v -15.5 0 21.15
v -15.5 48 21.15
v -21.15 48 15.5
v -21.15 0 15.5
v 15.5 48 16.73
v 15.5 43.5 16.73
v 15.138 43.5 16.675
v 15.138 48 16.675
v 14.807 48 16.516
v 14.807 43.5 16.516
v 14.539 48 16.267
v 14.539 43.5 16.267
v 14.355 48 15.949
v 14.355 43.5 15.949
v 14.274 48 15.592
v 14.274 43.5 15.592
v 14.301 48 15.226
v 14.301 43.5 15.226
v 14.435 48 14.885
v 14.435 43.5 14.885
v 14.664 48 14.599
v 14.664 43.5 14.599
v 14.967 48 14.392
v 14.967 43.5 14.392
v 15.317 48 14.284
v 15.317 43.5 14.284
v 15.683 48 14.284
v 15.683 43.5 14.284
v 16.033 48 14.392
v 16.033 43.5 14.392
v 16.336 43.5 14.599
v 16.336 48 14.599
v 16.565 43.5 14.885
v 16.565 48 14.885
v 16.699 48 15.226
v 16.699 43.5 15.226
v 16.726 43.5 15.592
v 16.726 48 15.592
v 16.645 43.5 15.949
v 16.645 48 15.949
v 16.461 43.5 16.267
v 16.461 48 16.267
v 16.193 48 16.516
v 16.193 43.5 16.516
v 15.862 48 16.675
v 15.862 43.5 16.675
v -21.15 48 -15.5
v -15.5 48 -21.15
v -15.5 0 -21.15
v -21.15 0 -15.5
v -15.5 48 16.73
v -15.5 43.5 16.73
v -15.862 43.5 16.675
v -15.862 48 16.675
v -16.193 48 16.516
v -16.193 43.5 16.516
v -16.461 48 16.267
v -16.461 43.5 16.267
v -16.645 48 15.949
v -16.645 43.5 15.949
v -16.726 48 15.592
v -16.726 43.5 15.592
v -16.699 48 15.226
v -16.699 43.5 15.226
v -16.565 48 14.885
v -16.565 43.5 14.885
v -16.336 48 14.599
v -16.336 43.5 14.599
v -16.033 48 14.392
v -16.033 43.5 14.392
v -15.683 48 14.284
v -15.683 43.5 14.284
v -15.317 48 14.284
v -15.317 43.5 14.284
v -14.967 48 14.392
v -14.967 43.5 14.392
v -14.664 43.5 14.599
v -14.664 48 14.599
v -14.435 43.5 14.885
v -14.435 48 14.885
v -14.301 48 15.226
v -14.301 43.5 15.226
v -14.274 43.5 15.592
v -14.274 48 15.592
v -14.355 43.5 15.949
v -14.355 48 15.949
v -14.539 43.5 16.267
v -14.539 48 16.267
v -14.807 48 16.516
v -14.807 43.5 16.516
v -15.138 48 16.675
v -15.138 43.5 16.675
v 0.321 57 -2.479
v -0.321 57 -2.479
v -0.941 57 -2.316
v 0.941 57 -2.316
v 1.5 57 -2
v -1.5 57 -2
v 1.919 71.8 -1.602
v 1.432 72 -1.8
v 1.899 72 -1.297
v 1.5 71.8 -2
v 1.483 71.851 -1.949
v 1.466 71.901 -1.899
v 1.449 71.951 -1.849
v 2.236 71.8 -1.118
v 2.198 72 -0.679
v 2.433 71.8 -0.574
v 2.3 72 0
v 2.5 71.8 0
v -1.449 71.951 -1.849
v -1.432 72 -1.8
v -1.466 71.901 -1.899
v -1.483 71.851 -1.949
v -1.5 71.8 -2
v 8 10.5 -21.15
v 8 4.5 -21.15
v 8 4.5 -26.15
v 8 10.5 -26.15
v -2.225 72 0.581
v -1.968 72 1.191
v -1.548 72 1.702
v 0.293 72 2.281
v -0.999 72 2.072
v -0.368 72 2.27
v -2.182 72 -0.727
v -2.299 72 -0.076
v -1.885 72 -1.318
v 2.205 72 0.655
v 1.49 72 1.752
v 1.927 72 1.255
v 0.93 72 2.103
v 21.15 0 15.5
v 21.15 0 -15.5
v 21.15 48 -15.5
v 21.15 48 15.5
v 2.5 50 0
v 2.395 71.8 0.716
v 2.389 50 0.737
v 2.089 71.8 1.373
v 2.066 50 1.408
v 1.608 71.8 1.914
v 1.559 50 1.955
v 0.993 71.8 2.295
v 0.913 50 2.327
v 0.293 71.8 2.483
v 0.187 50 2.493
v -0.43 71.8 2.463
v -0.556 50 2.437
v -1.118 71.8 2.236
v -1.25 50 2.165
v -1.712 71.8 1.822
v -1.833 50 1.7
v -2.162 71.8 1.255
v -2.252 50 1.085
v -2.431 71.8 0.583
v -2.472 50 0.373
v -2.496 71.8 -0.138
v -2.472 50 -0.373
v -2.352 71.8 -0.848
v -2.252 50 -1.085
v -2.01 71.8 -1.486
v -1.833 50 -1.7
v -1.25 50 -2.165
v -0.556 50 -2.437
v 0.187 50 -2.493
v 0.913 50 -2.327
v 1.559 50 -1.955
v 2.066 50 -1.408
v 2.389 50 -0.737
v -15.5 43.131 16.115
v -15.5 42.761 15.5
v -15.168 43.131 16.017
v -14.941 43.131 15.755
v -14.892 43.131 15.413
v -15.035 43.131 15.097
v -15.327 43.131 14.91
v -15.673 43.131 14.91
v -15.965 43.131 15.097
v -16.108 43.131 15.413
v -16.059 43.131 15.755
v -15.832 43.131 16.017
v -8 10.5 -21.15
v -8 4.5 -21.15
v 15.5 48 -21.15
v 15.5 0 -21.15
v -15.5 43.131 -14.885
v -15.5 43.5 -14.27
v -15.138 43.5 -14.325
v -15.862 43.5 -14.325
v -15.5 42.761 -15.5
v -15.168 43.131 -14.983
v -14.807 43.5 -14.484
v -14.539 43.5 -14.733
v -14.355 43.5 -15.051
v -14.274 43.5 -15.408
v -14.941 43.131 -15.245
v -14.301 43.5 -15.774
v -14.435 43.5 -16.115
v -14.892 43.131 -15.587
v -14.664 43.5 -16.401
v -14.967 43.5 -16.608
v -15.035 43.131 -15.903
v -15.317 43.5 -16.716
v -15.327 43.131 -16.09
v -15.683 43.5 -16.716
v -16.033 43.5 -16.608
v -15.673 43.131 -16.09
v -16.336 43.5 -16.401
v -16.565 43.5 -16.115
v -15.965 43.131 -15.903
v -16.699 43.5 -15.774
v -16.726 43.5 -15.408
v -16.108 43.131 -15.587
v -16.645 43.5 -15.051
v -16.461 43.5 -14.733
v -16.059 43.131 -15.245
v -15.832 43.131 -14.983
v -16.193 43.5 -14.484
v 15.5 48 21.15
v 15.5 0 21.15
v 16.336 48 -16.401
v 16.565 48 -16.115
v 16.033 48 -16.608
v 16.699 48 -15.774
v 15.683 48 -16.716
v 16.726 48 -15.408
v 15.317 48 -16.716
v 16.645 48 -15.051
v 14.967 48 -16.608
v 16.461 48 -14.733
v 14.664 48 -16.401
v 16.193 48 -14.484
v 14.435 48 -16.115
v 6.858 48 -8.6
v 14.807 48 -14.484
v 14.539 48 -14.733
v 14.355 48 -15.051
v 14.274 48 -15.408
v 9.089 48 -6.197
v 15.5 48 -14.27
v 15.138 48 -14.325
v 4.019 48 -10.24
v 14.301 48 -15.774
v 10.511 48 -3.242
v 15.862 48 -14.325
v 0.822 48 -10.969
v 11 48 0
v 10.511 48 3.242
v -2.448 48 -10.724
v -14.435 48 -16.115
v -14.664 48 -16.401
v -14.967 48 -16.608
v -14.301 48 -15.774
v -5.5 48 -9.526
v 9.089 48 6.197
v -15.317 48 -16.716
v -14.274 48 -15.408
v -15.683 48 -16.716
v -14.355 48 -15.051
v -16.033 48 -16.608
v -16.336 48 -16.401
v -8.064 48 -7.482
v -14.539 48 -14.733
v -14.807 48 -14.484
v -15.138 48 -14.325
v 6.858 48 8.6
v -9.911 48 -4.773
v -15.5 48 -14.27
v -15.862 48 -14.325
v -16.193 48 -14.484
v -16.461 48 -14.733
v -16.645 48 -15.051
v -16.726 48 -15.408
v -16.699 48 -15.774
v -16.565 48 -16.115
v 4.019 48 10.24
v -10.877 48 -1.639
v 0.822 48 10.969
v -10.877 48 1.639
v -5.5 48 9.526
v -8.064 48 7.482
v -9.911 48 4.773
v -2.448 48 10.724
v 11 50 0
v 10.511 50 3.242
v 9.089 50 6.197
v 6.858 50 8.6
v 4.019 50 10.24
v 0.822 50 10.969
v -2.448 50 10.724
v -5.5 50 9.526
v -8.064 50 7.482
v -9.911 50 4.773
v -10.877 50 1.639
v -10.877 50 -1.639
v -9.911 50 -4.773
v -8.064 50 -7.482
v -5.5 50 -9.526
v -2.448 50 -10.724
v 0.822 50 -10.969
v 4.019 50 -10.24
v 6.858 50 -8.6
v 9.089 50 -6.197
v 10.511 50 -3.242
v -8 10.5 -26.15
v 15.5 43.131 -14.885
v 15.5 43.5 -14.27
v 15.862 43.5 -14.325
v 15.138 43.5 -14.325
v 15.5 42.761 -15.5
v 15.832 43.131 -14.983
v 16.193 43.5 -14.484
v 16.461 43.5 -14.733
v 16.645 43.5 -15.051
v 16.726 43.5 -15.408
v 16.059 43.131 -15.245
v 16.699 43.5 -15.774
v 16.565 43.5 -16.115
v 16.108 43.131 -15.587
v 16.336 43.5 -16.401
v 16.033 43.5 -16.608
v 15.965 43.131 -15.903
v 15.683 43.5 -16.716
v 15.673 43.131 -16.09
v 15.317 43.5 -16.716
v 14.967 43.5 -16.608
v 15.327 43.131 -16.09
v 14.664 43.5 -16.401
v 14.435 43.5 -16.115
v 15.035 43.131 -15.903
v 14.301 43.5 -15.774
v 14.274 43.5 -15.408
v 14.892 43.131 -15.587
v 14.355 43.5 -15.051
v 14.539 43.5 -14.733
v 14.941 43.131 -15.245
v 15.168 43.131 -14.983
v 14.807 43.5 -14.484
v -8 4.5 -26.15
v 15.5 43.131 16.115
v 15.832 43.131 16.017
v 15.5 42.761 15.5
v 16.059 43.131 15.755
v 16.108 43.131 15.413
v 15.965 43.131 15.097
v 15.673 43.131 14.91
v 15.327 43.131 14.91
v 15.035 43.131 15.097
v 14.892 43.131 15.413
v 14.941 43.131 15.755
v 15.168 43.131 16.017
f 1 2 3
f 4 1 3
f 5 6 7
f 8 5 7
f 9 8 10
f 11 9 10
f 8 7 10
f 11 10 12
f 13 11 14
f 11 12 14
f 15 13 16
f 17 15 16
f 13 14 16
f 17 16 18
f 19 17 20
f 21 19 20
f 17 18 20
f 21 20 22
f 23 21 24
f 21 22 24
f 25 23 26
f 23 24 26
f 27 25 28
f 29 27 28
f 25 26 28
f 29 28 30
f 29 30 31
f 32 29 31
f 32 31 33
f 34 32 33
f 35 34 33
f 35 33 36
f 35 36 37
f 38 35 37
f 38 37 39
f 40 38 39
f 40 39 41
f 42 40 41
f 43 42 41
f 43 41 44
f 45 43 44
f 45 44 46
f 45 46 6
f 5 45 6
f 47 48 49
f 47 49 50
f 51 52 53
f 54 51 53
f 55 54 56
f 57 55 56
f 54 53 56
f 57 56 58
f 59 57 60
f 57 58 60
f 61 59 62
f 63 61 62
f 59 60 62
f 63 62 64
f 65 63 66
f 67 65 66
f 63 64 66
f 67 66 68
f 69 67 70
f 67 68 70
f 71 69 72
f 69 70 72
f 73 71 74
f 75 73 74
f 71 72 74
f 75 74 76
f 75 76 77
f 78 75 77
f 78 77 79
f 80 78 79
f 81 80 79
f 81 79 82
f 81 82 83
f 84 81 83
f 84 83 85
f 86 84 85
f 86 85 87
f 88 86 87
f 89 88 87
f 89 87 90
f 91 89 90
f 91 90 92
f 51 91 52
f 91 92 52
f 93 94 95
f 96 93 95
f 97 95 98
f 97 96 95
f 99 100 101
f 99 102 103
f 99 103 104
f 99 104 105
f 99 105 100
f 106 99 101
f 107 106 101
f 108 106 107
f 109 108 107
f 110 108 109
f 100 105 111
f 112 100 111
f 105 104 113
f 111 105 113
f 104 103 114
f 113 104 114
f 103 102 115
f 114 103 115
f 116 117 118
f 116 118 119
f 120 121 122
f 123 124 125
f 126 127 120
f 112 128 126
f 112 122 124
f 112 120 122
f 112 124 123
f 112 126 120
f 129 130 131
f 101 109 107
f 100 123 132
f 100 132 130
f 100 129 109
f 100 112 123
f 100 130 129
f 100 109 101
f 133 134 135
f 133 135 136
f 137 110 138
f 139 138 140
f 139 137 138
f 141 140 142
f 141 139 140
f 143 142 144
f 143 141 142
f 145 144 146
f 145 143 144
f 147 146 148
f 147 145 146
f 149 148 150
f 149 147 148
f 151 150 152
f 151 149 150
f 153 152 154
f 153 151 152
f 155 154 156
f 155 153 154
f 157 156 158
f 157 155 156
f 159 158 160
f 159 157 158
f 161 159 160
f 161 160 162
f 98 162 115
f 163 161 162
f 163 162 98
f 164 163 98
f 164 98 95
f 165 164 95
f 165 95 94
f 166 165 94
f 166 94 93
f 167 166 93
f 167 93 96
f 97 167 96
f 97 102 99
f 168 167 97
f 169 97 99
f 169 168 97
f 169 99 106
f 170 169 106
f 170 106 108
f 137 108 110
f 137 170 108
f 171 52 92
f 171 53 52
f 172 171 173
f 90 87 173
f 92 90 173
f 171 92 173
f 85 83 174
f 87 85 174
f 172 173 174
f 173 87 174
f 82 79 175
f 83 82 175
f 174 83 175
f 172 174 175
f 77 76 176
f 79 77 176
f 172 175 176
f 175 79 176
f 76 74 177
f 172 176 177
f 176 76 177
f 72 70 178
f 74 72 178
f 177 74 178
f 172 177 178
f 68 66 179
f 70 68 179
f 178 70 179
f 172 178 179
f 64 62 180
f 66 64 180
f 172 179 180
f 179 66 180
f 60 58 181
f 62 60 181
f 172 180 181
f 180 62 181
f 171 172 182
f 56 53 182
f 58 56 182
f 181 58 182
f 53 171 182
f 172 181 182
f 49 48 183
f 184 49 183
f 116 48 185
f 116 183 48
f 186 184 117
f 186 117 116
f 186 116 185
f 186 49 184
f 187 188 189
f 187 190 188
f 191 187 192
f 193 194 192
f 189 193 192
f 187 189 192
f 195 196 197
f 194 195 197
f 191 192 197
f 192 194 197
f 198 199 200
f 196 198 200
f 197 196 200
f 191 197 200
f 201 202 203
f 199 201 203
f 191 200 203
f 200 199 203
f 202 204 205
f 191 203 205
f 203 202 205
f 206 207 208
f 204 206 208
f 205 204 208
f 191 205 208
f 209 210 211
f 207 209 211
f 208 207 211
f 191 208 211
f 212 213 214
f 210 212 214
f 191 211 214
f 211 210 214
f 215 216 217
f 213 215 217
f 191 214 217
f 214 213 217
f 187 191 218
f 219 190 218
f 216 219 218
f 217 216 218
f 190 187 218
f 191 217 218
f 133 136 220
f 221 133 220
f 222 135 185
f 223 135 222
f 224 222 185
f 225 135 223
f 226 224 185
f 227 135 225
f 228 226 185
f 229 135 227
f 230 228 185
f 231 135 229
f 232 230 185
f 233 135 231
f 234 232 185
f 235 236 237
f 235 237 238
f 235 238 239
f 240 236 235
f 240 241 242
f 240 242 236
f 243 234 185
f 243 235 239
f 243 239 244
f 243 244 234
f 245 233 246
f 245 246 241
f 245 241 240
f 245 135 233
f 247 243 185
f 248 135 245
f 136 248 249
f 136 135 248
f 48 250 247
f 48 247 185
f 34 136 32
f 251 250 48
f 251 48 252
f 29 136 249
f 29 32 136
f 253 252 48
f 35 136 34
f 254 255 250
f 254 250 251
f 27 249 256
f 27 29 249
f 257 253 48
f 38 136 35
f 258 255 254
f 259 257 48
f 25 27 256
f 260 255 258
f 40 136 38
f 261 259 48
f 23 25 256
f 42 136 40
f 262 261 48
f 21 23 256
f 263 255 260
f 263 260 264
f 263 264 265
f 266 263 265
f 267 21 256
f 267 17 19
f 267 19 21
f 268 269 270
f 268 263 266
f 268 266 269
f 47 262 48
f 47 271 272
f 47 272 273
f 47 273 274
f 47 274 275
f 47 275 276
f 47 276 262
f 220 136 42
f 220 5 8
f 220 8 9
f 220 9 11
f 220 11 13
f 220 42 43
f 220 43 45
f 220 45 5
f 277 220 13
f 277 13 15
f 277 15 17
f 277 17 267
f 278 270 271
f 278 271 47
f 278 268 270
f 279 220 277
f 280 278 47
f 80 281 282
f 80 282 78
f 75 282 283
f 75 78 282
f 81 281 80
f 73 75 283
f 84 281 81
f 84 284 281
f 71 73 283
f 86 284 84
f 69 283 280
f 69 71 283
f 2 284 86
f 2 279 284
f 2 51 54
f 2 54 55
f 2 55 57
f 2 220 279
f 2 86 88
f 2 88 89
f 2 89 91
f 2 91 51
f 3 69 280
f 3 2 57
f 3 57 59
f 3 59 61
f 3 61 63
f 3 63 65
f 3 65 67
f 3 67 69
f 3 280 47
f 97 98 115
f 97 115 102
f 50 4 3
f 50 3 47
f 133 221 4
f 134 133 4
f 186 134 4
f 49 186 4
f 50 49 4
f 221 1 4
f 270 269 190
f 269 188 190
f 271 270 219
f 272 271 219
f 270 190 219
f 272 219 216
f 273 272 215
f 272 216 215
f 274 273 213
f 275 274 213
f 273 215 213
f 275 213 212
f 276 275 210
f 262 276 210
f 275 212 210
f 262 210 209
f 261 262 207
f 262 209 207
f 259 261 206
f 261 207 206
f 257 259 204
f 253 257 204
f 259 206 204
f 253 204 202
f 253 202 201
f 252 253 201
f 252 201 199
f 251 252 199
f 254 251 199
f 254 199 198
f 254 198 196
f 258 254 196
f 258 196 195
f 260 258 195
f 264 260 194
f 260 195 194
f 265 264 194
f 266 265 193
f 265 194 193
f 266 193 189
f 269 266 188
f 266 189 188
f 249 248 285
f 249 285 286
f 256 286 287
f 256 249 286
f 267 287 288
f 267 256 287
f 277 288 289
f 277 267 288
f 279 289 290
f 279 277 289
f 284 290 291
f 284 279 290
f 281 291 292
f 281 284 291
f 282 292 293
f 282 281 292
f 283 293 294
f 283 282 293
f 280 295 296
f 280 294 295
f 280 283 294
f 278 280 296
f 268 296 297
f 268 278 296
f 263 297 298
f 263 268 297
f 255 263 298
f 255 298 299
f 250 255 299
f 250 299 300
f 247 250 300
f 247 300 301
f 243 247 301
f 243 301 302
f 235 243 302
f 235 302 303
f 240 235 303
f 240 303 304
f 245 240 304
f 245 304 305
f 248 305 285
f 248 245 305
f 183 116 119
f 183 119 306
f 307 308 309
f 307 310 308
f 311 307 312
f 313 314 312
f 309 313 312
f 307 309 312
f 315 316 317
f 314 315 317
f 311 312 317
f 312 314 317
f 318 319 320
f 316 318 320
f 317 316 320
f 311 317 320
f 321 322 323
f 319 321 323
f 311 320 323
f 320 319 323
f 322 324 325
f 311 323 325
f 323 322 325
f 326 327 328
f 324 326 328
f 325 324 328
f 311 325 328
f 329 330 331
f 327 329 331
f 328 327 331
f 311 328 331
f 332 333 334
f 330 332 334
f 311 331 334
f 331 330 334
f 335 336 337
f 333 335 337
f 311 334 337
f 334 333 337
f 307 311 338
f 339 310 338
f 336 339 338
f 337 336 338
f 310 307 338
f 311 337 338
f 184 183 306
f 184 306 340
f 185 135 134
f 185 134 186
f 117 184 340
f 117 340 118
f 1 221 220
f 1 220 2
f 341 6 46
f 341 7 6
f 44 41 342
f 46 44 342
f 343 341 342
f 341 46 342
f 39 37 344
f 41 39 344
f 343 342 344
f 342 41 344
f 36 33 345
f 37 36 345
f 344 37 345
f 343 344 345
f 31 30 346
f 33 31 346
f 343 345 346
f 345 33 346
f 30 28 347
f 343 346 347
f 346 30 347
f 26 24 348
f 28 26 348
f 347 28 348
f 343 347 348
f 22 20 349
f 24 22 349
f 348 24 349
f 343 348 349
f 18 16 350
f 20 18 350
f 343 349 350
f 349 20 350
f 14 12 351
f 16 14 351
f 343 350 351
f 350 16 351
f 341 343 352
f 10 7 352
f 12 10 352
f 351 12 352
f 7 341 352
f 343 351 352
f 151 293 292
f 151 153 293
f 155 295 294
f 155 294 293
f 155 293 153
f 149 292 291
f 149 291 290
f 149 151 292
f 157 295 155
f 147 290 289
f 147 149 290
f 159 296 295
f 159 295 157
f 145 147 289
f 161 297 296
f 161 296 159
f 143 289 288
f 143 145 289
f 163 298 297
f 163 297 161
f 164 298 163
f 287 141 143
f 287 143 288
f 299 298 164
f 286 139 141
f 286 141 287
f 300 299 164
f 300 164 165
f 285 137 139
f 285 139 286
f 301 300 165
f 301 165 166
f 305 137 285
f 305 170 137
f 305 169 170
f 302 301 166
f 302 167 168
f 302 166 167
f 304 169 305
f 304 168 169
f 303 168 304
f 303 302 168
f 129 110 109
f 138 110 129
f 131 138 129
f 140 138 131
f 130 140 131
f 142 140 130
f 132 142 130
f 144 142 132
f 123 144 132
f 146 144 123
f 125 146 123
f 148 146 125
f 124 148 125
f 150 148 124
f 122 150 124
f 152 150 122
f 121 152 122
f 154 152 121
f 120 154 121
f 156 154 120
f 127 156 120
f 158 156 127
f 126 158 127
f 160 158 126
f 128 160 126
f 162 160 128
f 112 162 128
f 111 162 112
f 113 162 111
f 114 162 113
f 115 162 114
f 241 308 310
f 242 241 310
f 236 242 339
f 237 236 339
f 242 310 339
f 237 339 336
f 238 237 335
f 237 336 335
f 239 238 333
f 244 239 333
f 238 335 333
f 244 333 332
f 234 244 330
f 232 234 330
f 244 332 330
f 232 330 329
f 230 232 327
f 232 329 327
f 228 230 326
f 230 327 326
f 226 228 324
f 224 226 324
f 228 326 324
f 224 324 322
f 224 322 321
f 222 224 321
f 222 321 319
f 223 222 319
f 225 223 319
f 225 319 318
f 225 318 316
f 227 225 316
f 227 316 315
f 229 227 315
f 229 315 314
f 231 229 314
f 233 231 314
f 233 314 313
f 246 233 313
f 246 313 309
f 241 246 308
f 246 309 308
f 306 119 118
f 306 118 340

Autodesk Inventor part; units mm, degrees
ref_plane "YZ Plane" through (0, 0, 0) normal (1, 0, 0) x (0, 1, 0)
ref_plane "XZ Plane" through (0, 0, 0) normal (0, 1, 0) x (-1, 0, 0)
ref_plane "XY Plane" through (0, 0, 0) normal (0, 0, 1) x (1, 0, 0)
sketch "Sketch1" plane through (0, 0, 0) normal (0, 1, 0) x (-1, 0, 0)
  line L0 (-21.15, 21.15) -> (21.15, 21.15)
  line L1 (21.15, 21.15) -> (21.15, -21.15)
  line L2 (21.15, -21.15) -> (-21.15, -21.15)
  line L3 (-21.15, -21.15) -> (-21.15, 21.15)
  line L4 (-21.15, 21.15) -> (21.15, -21.15) construction
  line L5 (21.15, 21.15) -> (-21.15, -21.15) construction
  line L6 (-15.5, 15.5) -> (15.5, 15.5)
  line L7 (15.5, 15.5) -> (15.5, -15.5)
  line L8 (15.5, -15.5) -> (-15.5, -15.5)
  line L9 (-15.5, -15.5) -> (-15.5, 15.5)
  line L10 (-15.5, 15.5) -> (15.5, -15.5) construction
  line L11 (15.5, 15.5) -> (-15.5, -15.5) construction
  line L12 (15.5, -21.15) -> (21.15, -15.5)
  line L13 (-21.15, -15.5) -> (-15.5, -21.15)
  line L14 (-21.15, 15.5) -> (-15.5, 21.15)
  line L15 (15.5, 21.15) -> (21.15, 15.5)
  point P0 (0, 0)
  dimension "d0" = 42.3
  dimension "d1" = 42.3
  dimension "d2" = 31
  dimension "d3" = 31
  dimension "d4" = 31
  dimension "d5" = 31
  dimension "d6" = 31
  dimension "d7" = 31
  dimension "d8" = 45
extrude "Extrusion1" add sketch "Sketch1" along normal blind 48 contours L0 L15 L1 L12 L2 L13 L3 L14 | L6 L7 L8 L9
sketch "Sketch2" plane through (0, 48, 0) normal (0, 1, 0) x (1, 0, 0)
  circle A0 centre (0, 0) radius 11
  dimension "d11" = 22
extrude "Extrusion2" add sketch "Sketch2" along normal blind 2
sketch "Sketch3" plane through (0, 50, 0) normal (0, 1, 0) x (1, 0, 0)
  circle A0 centre (0, 0) radius 2.5
  dimension "d14" = 5
extrude "Extrusion3" add sketch "Sketch3" along normal blind 22
sketch "Sketch4" plane through (0, 72, 0) normal (0, 1, 0) x (1, 0, 0)
  circle A0 centre (0, 0) radius 2.5 projected
  line L0 (-1.5, 2) -> (1.5, 2)
  circle A1 centre (0, 0) radius 2.5 projected
  dimension "d21" = 5
  dimension "d20" = 2
extrude "Extrusion4" cut sketch "Sketch4" against normal blind 15 contours L0 A0 picked at (-0.3466, 2.0912)
chamfer "Chamfer2" distance 0.2 angle 45 3 edges at (-1.118, 72, 2.2361) (2.2361, 72, -1.118) (0, 72, -2)
sketch "Sketch5" plane through (0, 48, 0) normal (0, 1, 0) x (1, 0, 0)
  circle A0 centre (0, 0) radius 11 projected
  line L0 (-15.5, -21.15) -> (15.5, -21.15) projected
  line L1 (15.5, -21.15) -> (21.15, -15.5) projected
  line L2 (21.15, -15.5) -> (21.15, 15.5) projected
  line L3 (21.15, 15.5) -> (15.5, 21.15) projected
  line L4 (15.5, 21.15) -> (-15.5, 21.15) projected
  line L5 (-15.5, 21.15) -> (-21.15, 15.5) projected
  line L6 (-21.15, 15.5) -> (-21.15, -15.5) projected
  line L7 (-21.15, -15.5) -> (-15.5, -21.15) projected
  point P0 (-15.5, 15.5)
  point P1 (15.5, 15.5)
  point P2 (-15.5, -15.5)
  point P3 (15.5, -15.5)
  dimension "d29" = 31
  dimension "d32" = 31
  dimension "d35" = 15.5
  dimension "d36" = 15.5
hole "Hole1" at (-15.5, 48, -15.5) at (15.5, 48, -15.5) at (-15.5, 48, 15.5) at (15.5, 48, 15.5) direction (0, -1, 0) diameter 2.459 depth 4.5 tip angle 118 thread size "M3x0.5" class "6H" standard "ANSI Metric M Profile"
sketch "Sketch6" plane through (15.5, 0, -21.15) normal (0, 0, -1) x (-1, 0, 0)
  line L0 (0, 0) -> (31, 0) projected
  line L1 (31, 0) -> (31, 48) projected
  line L2 (0, 48) -> (31, 48) projected
  line L3 (0, 0) -> (0, 48) projected
  line L4 (7.5, 10.5) -> (23.5, 10.5)
  line L5 (23.5, 10.5) -> (23.5, 4.5)
  line L6 (23.5, 4.5) -> (7.5, 4.5)
  line L7 (7.5, 4.5) -> (7.5, 10.5)
  point P0 (15.5, 0)
  dimension "d44" = 16
  dimension "d45" = 6
  dimension "d46" = 10.5
  dimension "d47" = 31
  dimension "d48" = 7.5
extrude "Extrusion5" add sketch "Sketch6" along normal blind 5 contours L4 L5 L6 L7
equation "\"d35\" = 0.5 * d29"
equation "\"d36\" = 0.5 * d32"
equation "\"d48\" = -0.5 * d44 + 0.5 * d47"
properties part number "Stepper_NEMA17_48mm"
